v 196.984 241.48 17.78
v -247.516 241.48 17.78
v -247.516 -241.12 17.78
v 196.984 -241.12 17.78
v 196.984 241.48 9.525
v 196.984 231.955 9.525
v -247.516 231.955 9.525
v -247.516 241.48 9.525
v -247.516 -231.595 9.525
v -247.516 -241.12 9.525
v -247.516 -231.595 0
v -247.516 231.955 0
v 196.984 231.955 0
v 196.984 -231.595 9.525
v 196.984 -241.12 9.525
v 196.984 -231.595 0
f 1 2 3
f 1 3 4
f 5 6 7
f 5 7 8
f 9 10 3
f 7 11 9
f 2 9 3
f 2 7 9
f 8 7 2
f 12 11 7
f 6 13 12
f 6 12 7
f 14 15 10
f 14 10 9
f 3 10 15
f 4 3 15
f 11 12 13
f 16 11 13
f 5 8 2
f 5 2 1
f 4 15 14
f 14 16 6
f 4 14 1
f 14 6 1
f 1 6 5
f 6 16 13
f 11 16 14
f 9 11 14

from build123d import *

# Parameters (mm, degrees)
F0_W     = 444.5
F0_H     = 482.6
F1_DEPTH = 17.78
F2_W     = 9.525
F2_H     = 9.525
F3_DEPTH = 444.5


# Not quite as in the source:
# - a feature of the source that left no trace in its solid (it failed there, or was rolled back) is left out


with BuildPart() as f1:
    # F0 (on Top) → F1 (new body)
    with BuildSketch(Plane.XY):
        with Locations((-25.2657681704, 0.1800126585)):
            Rectangle(F0_W, F0_H)
    extrude(amount=F1_DEPTH)

    # F2 (on face) → F3 (cut)
    with BuildSketch(Plane.YZ.offset(196.9842318296)):
        with Locations((236.7175126585, 4.7625)):
            Rectangle(F2_W, F2_H)
        with Locations((-236.3574873415, 4.7625)):
            Rectangle(F2_W, F2_H)
    extrude(amount=-F3_DEPTH, mode=Mode.SUBTRACT)


solid = f1.part
